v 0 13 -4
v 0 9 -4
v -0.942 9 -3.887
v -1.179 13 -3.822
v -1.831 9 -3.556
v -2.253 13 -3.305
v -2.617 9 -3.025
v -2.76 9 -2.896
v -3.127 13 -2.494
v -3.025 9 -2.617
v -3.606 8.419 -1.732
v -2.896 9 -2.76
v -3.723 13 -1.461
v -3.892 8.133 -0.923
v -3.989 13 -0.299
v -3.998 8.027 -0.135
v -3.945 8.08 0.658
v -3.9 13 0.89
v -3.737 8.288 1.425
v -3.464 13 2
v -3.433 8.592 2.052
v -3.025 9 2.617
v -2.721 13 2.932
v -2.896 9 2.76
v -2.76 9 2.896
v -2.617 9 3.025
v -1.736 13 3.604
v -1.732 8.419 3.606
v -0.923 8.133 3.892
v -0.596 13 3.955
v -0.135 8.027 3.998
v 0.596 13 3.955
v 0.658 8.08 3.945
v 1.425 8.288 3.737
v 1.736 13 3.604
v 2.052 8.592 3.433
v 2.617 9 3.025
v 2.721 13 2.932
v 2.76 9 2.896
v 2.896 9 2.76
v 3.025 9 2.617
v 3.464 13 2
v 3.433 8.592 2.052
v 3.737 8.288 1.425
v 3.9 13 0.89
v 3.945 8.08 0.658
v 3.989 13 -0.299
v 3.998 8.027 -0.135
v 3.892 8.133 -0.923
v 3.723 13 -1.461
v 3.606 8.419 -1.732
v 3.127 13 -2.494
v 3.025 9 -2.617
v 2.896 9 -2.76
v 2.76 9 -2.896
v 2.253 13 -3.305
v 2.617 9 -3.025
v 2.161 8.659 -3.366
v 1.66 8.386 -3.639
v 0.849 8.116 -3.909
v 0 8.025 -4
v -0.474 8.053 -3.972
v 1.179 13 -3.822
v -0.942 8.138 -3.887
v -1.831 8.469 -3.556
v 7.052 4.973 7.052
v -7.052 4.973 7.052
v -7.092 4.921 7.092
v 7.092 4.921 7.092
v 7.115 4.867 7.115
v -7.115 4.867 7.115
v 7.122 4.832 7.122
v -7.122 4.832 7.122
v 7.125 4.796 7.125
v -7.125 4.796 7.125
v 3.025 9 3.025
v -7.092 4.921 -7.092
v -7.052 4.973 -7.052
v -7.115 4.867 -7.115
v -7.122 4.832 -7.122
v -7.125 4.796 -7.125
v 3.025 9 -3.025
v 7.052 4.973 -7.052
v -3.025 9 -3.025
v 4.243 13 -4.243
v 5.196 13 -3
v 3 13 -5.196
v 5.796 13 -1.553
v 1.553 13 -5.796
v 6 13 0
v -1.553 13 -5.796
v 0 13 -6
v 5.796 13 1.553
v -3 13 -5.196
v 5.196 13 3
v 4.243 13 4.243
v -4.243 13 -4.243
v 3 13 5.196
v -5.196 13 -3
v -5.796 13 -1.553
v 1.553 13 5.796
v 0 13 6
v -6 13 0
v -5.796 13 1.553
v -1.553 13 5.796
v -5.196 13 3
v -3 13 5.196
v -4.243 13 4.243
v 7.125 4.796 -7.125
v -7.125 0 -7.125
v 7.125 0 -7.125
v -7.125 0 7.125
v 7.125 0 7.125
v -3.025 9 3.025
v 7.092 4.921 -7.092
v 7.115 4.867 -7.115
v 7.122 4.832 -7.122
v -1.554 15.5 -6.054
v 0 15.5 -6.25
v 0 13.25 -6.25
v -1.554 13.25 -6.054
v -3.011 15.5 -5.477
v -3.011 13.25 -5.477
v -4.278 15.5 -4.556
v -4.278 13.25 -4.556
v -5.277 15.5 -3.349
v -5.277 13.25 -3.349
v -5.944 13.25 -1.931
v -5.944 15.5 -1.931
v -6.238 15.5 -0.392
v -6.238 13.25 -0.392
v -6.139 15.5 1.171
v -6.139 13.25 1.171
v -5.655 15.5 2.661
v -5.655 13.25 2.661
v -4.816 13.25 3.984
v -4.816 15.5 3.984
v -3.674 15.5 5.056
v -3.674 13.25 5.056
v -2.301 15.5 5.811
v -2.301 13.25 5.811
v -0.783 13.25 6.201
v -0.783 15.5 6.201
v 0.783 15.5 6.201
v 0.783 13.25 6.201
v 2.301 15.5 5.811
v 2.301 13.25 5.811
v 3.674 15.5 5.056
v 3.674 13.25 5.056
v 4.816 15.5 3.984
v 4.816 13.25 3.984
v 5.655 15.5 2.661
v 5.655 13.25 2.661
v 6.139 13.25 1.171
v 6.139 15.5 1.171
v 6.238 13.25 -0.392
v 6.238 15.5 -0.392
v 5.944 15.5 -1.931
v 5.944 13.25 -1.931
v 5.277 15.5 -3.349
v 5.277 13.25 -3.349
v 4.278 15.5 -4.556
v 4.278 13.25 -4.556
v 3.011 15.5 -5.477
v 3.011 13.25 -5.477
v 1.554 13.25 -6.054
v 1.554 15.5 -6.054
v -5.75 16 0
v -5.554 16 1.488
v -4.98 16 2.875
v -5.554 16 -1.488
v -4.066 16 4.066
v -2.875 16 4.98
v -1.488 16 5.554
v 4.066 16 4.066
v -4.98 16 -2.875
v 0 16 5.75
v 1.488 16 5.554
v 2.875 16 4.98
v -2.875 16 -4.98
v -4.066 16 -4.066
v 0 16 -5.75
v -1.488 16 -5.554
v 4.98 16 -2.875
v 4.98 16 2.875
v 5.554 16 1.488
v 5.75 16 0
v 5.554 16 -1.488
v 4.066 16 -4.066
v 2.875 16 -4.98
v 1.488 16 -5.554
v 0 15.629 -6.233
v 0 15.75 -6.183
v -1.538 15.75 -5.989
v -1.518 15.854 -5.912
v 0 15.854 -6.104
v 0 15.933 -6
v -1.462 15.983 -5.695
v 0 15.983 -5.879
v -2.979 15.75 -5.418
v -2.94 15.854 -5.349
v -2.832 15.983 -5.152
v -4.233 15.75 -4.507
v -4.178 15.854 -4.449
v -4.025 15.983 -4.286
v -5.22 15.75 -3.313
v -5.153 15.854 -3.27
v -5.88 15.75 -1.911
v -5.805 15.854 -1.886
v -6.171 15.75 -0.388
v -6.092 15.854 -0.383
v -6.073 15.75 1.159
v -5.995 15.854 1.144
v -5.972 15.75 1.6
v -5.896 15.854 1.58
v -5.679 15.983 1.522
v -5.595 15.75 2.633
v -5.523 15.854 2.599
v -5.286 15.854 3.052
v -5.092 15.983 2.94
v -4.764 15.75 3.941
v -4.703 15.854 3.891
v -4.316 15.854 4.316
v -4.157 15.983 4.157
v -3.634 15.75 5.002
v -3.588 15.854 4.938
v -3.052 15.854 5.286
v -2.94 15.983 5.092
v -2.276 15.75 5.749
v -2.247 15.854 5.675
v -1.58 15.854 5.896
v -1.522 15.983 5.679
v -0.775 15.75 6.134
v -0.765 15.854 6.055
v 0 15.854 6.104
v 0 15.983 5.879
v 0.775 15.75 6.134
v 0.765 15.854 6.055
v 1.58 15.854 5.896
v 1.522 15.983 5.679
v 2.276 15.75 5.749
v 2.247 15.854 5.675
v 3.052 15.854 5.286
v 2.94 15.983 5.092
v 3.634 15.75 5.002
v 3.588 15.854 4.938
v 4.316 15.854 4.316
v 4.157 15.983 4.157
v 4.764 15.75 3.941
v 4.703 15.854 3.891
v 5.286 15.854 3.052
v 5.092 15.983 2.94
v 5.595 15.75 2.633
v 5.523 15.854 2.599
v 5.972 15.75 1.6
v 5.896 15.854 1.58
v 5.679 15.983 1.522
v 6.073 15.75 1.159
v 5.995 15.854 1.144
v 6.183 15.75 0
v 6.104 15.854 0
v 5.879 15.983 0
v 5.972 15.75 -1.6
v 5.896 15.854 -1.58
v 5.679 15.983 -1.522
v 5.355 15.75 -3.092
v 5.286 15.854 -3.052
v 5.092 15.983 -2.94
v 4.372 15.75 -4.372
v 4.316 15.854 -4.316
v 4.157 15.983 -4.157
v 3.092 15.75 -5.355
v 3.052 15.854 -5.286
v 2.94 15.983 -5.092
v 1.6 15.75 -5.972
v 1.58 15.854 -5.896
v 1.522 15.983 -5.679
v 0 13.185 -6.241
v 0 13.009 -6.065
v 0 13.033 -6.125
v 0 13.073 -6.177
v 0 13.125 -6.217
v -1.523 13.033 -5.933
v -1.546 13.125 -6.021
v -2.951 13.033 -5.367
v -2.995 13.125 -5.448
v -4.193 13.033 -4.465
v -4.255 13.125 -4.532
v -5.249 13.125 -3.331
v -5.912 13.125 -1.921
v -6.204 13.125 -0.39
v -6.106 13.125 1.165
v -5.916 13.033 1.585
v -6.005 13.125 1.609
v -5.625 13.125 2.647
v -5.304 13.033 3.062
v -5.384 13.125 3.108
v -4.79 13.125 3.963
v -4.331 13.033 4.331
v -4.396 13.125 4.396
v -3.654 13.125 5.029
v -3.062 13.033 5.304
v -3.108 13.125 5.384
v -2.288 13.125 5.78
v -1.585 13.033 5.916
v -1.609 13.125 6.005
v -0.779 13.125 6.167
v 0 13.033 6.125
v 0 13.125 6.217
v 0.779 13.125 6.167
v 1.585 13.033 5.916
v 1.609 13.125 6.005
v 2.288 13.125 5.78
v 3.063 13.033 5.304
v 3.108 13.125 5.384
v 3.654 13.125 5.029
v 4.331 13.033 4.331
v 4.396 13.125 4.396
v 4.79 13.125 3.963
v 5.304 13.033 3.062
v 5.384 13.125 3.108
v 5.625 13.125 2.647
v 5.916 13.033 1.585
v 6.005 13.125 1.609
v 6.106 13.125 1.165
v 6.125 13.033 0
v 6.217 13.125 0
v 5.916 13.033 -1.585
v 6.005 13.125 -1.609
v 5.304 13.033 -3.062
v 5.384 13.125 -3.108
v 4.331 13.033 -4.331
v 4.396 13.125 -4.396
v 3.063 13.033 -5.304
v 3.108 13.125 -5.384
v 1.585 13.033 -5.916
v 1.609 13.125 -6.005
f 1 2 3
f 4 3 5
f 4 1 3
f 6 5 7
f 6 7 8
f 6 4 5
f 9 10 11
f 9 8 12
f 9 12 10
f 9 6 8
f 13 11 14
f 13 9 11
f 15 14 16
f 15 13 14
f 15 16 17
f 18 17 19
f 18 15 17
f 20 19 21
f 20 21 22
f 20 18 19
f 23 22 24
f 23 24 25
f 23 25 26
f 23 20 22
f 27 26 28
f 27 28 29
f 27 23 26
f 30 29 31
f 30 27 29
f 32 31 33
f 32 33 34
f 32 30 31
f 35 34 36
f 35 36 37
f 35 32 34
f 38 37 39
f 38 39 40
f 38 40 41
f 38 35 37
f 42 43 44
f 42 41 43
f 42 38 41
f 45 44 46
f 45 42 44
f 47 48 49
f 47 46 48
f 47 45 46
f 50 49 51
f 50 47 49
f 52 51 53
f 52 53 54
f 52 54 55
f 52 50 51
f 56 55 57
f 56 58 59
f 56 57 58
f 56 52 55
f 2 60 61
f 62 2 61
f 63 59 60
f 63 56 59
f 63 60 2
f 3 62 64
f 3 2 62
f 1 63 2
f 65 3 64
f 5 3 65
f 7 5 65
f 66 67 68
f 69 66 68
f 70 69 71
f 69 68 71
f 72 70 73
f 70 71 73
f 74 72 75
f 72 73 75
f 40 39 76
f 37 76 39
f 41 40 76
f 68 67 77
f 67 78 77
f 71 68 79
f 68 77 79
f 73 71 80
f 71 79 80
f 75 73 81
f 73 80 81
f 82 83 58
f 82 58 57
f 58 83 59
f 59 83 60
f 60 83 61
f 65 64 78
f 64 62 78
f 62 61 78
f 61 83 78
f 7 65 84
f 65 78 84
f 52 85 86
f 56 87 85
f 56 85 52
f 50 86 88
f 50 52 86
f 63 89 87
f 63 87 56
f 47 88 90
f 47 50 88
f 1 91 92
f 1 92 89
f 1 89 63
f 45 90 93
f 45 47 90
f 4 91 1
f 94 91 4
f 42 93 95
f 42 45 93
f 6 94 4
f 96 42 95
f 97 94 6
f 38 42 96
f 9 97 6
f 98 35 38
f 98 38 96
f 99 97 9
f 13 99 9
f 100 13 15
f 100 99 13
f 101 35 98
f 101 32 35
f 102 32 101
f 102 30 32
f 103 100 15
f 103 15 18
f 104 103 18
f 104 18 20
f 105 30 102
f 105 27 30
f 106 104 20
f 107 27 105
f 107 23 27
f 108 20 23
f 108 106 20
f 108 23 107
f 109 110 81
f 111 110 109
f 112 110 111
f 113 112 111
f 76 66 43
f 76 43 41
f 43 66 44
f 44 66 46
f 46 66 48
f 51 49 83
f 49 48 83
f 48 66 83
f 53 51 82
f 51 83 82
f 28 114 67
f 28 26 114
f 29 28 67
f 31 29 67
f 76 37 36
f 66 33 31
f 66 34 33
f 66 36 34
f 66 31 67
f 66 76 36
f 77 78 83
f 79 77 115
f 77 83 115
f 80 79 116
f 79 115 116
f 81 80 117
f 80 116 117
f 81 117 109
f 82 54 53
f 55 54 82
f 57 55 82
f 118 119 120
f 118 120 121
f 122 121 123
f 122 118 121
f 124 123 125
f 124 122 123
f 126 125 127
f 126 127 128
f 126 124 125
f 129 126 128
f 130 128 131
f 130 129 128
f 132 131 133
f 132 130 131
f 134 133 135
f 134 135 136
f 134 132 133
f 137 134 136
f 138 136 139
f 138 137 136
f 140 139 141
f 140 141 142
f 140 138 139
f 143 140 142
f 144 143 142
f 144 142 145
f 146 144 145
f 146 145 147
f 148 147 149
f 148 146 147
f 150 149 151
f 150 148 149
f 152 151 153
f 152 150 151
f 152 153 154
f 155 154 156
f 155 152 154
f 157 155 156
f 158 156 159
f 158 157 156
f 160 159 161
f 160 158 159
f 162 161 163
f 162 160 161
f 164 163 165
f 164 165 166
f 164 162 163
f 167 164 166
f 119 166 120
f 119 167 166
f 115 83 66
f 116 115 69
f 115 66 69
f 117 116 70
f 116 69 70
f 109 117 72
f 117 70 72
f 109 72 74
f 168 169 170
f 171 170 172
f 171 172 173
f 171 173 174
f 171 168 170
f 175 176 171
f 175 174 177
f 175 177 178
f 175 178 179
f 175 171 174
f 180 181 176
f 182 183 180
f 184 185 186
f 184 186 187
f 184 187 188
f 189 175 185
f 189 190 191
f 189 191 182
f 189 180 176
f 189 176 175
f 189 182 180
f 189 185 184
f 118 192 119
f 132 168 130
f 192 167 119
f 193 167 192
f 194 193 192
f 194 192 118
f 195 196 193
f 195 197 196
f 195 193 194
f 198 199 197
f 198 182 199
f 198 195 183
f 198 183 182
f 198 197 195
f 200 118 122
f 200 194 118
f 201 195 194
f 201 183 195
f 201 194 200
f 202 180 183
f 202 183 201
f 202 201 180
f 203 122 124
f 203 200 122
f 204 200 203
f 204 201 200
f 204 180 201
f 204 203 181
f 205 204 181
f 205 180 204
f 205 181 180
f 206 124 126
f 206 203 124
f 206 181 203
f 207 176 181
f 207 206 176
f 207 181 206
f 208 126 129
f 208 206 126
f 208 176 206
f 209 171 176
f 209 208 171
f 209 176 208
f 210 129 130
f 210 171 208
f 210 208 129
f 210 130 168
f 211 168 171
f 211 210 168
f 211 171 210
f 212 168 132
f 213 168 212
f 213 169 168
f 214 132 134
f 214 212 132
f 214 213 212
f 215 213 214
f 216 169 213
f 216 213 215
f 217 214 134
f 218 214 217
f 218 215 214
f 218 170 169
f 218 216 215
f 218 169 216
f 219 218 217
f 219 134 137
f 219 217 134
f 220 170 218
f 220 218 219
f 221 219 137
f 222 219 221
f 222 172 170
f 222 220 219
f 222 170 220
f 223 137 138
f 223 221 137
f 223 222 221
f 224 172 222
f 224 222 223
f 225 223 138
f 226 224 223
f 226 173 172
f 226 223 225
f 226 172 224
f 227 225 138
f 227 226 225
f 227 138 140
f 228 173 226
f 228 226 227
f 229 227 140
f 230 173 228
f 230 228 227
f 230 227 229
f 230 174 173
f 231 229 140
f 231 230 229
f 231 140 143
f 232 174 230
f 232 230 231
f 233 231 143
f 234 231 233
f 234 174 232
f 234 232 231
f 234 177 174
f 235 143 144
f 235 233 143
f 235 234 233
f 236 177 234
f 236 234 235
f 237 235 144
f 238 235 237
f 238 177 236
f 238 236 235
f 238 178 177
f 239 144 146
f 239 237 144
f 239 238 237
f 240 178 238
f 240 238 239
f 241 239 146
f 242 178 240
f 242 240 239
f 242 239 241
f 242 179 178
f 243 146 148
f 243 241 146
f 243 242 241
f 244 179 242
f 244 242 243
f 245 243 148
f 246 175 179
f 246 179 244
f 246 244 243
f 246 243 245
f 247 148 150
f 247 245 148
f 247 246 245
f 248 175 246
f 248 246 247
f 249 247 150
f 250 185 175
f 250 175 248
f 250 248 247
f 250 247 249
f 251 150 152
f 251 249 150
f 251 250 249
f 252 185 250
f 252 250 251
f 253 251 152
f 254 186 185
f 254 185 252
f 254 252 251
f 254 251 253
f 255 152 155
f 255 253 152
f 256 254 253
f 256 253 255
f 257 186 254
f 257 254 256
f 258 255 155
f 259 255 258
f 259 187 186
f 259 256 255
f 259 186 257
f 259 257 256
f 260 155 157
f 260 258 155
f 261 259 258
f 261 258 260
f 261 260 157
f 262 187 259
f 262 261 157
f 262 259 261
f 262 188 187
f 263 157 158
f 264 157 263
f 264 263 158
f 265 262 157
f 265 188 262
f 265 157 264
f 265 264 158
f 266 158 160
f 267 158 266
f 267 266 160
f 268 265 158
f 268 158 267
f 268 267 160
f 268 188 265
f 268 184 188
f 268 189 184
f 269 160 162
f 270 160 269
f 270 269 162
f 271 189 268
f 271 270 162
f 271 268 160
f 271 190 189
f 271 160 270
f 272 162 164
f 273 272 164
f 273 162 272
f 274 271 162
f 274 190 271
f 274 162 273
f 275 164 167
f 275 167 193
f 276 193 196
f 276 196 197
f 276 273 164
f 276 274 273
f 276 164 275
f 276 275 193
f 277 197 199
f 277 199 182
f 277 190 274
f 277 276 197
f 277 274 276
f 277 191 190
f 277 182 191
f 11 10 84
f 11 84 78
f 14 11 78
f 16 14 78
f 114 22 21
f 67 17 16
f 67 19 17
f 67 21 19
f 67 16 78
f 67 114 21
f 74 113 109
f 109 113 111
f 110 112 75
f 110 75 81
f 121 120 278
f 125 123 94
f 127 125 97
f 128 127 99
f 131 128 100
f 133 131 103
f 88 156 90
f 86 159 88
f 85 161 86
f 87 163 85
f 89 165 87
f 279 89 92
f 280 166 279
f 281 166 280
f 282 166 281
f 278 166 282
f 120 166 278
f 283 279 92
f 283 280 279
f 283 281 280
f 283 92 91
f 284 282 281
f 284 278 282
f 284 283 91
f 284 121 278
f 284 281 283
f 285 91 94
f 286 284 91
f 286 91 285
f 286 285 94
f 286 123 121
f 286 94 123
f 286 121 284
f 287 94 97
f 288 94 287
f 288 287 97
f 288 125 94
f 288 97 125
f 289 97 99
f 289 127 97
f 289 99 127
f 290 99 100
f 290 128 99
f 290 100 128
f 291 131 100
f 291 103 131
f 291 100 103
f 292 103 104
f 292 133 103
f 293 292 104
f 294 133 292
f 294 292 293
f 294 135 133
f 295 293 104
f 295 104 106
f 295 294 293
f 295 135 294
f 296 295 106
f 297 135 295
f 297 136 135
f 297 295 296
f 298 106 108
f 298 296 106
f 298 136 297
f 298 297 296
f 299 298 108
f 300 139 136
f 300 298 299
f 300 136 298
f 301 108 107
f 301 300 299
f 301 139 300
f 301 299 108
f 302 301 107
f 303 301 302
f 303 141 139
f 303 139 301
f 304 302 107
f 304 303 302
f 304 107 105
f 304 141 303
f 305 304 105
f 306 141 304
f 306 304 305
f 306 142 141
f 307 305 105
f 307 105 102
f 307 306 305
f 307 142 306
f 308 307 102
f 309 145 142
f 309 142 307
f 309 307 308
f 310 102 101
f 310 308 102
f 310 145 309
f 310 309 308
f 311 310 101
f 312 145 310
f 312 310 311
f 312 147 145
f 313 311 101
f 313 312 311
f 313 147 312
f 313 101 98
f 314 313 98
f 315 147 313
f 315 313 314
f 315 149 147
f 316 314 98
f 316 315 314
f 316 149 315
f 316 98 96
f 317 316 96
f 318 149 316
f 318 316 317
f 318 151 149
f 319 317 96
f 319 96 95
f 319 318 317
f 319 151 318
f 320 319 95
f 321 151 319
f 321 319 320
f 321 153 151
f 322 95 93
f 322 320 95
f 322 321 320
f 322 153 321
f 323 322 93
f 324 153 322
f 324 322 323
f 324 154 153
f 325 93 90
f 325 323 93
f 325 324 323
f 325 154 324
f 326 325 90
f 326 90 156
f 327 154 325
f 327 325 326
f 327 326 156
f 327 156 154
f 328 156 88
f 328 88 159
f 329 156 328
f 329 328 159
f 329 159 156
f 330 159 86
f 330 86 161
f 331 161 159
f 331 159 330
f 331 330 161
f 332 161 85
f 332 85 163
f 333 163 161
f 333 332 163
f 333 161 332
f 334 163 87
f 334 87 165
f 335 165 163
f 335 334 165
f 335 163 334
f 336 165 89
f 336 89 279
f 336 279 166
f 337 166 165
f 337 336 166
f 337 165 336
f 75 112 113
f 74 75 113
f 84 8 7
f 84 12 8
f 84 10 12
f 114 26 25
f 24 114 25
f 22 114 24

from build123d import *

# Parameters (mm, degrees)
SKIZZE1_W                       = 14.25
SKIZZE1_H                       = 14.25
AUFSATZ_LINEAR_AUSTRAGEN1_DEPTH = 16
FASE1_SIZE                      = 4.1
VERRUNDUNG2_R                   = 0.5
VERRUNDUNG3_R                   = 0.25
VERRUNDUNG4_R                   = 0.25


with BuildPart() as part:
    # Skizze1 → Aufsatz-Linear austragen1 (new body)
    with BuildSketch(Plane(origin=(0, 0, 0), x_dir=(1, 0, 0), z_dir=(0, 1, 0))):
        Rectangle(SKIZZE1_W, SKIZZE1_H)
    extrude(amount=AUFSATZ_LINEAR_AUSTRAGEN1_DEPTH)

    # Skizze6 → Schnitt-Rotation4 (revolve, cut)
    with BuildSketch(Plane(origin=(0, 0, 0), x_dir=(0, 0, -1), z_dir=(1, 0, 0))):
        Polygon((6.25, 16), (13.25, 16), (13.25, 9), (4, 9), (4, 13), (6.25, 13), align=None)
    revolve(axis=Axis((0, 0, 0), (0, 1, 0)), mode=Mode.SUBTRACT)

    # Fase1
    # the kernel refuses this chamfer: 4.1 mm, written as the material it takes off along each edge
    with BuildSketch(Plane(origin=(17.668900251, 9, 7.125), x_dir=(0, 0.027495876610586303, -0.9996219169112966), z_dir=(-1, 0, 0))) as fase1_piece_1_section:
        Polygon((FASE1_SIZE * 0.999621916911, FASE1_SIZE * 0.0274958766106), (-FASE1_SIZE * 0.0274958766106, FASE1_SIZE * 0.999621916911), (0, 0), align=None)
    fase1_piece_1 = extrude(amount=35.337800501, mode=Mode.PRIVATE)
    fase1_piece_1 = fase1_piece_1 - Plane(origin=(0, 7.640449018, 0), x_dir=(0, 0, -1), z_dir=(0, 1, 0)) * Cylinder(4, 88, mode=Mode.PRIVATE)
    add(fase1_piece_1, mode=Mode.SUBTRACT)
    with BuildSketch(Plane(origin=(7.125, 9, -17.668900251), x_dir=(0.027495876610586303, -0.9996219169112966, 0), z_dir=(0, 0, 1))) as fase1_piece_2_section:
        Polygon((FASE1_SIZE * 0.999621916911, -FASE1_SIZE * 0.0274958766106), (-FASE1_SIZE * 0.0274958766106, -FASE1_SIZE * 0.999621916911), (0, 0), align=None)
    fase1_piece_2 = extrude(amount=35.337800501, mode=Mode.PRIVATE)
    fase1_piece_2 = fase1_piece_2 - Plane(origin=(0, 7.640449013, 0), x_dir=(0, 0, -1), z_dir=(0, 1, 0)) * Cylinder(4, 88, mode=Mode.PRIVATE)
    add(fase1_piece_2, mode=Mode.SUBTRACT)
    with BuildSketch(Plane(origin=(-17.668900251, 9, -7.125), x_dir=(0, -0.9996219169112966, -0.027495876610586303), z_dir=(1, 0, 0))) as fase1_piece_3_section:
        Polygon((FASE1_SIZE * 0.999621916911, -FASE1_SIZE * 0.0274958766106), (-FASE1_SIZE * 0.0274958766106, -FASE1_SIZE * 0.999621916911), (0, 0), align=None)
    fase1_piece_3 = extrude(amount=35.337800501, mode=Mode.PRIVATE)
    fase1_piece_3 = fase1_piece_3 - Plane(origin=(0, 7.640449014, 0), x_dir=(0, 0, -1), z_dir=(0, 1, 0)) * Cylinder(4, 88, mode=Mode.PRIVATE)
    add(fase1_piece_3, mode=Mode.SUBTRACT)
    with BuildSketch(Plane(origin=(-7.125, 9, 17.668900251), x_dir=(0.9996219169112966, 0.027495876610586303, 0), z_dir=(0, 0, -1))) as fase1_piece_4_section:
        Polygon((FASE1_SIZE * 0.999621916911, FASE1_SIZE * 0.0274958766106), (-FASE1_SIZE * 0.0274958766106, FASE1_SIZE * 0.999621916911), (0, 0), align=None)
    fase1_piece_4 = extrude(amount=35.337800501, mode=Mode.PRIVATE)
    fase1_piece_4 = fase1_piece_4 - Plane(origin=(0, 7.640449018, 0), x_dir=(0, 0, -1), z_dir=(0, 1, 0)) * Cylinder(4, 88, mode=Mode.PRIVATE)
    add(fase1_piece_4, mode=Mode.SUBTRACT)

    # Verrundung2
    verrundung2_edges = [part.edges().sort_by_distance(p)[0] for p in [
        (0, 16, 6.25),
    ]]
    fillet(verrundung2_edges, radius=VERRUNDUNG2_R)

    # Verrundung3
    verrundung3_edges = [part.edges().sort_by_distance(p)[0] for p in [
        (-7.125, 4.9, 0),
        (0, 4.9, -7.125),
        (7.125, 4.9, 0),
        (0, 4.9, 7.125),
    ]]
    fillet(verrundung3_edges, radius=VERRUNDUNG3_R)

    # Verrundung4
    verrundung4_edges = [part.edges().sort_by_distance(p)[0] for p in [
        (0, 13, 6.25),
    ]]
    fillet(verrundung4_edges, radius=VERRUNDUNG4_R)


solid = part.part
